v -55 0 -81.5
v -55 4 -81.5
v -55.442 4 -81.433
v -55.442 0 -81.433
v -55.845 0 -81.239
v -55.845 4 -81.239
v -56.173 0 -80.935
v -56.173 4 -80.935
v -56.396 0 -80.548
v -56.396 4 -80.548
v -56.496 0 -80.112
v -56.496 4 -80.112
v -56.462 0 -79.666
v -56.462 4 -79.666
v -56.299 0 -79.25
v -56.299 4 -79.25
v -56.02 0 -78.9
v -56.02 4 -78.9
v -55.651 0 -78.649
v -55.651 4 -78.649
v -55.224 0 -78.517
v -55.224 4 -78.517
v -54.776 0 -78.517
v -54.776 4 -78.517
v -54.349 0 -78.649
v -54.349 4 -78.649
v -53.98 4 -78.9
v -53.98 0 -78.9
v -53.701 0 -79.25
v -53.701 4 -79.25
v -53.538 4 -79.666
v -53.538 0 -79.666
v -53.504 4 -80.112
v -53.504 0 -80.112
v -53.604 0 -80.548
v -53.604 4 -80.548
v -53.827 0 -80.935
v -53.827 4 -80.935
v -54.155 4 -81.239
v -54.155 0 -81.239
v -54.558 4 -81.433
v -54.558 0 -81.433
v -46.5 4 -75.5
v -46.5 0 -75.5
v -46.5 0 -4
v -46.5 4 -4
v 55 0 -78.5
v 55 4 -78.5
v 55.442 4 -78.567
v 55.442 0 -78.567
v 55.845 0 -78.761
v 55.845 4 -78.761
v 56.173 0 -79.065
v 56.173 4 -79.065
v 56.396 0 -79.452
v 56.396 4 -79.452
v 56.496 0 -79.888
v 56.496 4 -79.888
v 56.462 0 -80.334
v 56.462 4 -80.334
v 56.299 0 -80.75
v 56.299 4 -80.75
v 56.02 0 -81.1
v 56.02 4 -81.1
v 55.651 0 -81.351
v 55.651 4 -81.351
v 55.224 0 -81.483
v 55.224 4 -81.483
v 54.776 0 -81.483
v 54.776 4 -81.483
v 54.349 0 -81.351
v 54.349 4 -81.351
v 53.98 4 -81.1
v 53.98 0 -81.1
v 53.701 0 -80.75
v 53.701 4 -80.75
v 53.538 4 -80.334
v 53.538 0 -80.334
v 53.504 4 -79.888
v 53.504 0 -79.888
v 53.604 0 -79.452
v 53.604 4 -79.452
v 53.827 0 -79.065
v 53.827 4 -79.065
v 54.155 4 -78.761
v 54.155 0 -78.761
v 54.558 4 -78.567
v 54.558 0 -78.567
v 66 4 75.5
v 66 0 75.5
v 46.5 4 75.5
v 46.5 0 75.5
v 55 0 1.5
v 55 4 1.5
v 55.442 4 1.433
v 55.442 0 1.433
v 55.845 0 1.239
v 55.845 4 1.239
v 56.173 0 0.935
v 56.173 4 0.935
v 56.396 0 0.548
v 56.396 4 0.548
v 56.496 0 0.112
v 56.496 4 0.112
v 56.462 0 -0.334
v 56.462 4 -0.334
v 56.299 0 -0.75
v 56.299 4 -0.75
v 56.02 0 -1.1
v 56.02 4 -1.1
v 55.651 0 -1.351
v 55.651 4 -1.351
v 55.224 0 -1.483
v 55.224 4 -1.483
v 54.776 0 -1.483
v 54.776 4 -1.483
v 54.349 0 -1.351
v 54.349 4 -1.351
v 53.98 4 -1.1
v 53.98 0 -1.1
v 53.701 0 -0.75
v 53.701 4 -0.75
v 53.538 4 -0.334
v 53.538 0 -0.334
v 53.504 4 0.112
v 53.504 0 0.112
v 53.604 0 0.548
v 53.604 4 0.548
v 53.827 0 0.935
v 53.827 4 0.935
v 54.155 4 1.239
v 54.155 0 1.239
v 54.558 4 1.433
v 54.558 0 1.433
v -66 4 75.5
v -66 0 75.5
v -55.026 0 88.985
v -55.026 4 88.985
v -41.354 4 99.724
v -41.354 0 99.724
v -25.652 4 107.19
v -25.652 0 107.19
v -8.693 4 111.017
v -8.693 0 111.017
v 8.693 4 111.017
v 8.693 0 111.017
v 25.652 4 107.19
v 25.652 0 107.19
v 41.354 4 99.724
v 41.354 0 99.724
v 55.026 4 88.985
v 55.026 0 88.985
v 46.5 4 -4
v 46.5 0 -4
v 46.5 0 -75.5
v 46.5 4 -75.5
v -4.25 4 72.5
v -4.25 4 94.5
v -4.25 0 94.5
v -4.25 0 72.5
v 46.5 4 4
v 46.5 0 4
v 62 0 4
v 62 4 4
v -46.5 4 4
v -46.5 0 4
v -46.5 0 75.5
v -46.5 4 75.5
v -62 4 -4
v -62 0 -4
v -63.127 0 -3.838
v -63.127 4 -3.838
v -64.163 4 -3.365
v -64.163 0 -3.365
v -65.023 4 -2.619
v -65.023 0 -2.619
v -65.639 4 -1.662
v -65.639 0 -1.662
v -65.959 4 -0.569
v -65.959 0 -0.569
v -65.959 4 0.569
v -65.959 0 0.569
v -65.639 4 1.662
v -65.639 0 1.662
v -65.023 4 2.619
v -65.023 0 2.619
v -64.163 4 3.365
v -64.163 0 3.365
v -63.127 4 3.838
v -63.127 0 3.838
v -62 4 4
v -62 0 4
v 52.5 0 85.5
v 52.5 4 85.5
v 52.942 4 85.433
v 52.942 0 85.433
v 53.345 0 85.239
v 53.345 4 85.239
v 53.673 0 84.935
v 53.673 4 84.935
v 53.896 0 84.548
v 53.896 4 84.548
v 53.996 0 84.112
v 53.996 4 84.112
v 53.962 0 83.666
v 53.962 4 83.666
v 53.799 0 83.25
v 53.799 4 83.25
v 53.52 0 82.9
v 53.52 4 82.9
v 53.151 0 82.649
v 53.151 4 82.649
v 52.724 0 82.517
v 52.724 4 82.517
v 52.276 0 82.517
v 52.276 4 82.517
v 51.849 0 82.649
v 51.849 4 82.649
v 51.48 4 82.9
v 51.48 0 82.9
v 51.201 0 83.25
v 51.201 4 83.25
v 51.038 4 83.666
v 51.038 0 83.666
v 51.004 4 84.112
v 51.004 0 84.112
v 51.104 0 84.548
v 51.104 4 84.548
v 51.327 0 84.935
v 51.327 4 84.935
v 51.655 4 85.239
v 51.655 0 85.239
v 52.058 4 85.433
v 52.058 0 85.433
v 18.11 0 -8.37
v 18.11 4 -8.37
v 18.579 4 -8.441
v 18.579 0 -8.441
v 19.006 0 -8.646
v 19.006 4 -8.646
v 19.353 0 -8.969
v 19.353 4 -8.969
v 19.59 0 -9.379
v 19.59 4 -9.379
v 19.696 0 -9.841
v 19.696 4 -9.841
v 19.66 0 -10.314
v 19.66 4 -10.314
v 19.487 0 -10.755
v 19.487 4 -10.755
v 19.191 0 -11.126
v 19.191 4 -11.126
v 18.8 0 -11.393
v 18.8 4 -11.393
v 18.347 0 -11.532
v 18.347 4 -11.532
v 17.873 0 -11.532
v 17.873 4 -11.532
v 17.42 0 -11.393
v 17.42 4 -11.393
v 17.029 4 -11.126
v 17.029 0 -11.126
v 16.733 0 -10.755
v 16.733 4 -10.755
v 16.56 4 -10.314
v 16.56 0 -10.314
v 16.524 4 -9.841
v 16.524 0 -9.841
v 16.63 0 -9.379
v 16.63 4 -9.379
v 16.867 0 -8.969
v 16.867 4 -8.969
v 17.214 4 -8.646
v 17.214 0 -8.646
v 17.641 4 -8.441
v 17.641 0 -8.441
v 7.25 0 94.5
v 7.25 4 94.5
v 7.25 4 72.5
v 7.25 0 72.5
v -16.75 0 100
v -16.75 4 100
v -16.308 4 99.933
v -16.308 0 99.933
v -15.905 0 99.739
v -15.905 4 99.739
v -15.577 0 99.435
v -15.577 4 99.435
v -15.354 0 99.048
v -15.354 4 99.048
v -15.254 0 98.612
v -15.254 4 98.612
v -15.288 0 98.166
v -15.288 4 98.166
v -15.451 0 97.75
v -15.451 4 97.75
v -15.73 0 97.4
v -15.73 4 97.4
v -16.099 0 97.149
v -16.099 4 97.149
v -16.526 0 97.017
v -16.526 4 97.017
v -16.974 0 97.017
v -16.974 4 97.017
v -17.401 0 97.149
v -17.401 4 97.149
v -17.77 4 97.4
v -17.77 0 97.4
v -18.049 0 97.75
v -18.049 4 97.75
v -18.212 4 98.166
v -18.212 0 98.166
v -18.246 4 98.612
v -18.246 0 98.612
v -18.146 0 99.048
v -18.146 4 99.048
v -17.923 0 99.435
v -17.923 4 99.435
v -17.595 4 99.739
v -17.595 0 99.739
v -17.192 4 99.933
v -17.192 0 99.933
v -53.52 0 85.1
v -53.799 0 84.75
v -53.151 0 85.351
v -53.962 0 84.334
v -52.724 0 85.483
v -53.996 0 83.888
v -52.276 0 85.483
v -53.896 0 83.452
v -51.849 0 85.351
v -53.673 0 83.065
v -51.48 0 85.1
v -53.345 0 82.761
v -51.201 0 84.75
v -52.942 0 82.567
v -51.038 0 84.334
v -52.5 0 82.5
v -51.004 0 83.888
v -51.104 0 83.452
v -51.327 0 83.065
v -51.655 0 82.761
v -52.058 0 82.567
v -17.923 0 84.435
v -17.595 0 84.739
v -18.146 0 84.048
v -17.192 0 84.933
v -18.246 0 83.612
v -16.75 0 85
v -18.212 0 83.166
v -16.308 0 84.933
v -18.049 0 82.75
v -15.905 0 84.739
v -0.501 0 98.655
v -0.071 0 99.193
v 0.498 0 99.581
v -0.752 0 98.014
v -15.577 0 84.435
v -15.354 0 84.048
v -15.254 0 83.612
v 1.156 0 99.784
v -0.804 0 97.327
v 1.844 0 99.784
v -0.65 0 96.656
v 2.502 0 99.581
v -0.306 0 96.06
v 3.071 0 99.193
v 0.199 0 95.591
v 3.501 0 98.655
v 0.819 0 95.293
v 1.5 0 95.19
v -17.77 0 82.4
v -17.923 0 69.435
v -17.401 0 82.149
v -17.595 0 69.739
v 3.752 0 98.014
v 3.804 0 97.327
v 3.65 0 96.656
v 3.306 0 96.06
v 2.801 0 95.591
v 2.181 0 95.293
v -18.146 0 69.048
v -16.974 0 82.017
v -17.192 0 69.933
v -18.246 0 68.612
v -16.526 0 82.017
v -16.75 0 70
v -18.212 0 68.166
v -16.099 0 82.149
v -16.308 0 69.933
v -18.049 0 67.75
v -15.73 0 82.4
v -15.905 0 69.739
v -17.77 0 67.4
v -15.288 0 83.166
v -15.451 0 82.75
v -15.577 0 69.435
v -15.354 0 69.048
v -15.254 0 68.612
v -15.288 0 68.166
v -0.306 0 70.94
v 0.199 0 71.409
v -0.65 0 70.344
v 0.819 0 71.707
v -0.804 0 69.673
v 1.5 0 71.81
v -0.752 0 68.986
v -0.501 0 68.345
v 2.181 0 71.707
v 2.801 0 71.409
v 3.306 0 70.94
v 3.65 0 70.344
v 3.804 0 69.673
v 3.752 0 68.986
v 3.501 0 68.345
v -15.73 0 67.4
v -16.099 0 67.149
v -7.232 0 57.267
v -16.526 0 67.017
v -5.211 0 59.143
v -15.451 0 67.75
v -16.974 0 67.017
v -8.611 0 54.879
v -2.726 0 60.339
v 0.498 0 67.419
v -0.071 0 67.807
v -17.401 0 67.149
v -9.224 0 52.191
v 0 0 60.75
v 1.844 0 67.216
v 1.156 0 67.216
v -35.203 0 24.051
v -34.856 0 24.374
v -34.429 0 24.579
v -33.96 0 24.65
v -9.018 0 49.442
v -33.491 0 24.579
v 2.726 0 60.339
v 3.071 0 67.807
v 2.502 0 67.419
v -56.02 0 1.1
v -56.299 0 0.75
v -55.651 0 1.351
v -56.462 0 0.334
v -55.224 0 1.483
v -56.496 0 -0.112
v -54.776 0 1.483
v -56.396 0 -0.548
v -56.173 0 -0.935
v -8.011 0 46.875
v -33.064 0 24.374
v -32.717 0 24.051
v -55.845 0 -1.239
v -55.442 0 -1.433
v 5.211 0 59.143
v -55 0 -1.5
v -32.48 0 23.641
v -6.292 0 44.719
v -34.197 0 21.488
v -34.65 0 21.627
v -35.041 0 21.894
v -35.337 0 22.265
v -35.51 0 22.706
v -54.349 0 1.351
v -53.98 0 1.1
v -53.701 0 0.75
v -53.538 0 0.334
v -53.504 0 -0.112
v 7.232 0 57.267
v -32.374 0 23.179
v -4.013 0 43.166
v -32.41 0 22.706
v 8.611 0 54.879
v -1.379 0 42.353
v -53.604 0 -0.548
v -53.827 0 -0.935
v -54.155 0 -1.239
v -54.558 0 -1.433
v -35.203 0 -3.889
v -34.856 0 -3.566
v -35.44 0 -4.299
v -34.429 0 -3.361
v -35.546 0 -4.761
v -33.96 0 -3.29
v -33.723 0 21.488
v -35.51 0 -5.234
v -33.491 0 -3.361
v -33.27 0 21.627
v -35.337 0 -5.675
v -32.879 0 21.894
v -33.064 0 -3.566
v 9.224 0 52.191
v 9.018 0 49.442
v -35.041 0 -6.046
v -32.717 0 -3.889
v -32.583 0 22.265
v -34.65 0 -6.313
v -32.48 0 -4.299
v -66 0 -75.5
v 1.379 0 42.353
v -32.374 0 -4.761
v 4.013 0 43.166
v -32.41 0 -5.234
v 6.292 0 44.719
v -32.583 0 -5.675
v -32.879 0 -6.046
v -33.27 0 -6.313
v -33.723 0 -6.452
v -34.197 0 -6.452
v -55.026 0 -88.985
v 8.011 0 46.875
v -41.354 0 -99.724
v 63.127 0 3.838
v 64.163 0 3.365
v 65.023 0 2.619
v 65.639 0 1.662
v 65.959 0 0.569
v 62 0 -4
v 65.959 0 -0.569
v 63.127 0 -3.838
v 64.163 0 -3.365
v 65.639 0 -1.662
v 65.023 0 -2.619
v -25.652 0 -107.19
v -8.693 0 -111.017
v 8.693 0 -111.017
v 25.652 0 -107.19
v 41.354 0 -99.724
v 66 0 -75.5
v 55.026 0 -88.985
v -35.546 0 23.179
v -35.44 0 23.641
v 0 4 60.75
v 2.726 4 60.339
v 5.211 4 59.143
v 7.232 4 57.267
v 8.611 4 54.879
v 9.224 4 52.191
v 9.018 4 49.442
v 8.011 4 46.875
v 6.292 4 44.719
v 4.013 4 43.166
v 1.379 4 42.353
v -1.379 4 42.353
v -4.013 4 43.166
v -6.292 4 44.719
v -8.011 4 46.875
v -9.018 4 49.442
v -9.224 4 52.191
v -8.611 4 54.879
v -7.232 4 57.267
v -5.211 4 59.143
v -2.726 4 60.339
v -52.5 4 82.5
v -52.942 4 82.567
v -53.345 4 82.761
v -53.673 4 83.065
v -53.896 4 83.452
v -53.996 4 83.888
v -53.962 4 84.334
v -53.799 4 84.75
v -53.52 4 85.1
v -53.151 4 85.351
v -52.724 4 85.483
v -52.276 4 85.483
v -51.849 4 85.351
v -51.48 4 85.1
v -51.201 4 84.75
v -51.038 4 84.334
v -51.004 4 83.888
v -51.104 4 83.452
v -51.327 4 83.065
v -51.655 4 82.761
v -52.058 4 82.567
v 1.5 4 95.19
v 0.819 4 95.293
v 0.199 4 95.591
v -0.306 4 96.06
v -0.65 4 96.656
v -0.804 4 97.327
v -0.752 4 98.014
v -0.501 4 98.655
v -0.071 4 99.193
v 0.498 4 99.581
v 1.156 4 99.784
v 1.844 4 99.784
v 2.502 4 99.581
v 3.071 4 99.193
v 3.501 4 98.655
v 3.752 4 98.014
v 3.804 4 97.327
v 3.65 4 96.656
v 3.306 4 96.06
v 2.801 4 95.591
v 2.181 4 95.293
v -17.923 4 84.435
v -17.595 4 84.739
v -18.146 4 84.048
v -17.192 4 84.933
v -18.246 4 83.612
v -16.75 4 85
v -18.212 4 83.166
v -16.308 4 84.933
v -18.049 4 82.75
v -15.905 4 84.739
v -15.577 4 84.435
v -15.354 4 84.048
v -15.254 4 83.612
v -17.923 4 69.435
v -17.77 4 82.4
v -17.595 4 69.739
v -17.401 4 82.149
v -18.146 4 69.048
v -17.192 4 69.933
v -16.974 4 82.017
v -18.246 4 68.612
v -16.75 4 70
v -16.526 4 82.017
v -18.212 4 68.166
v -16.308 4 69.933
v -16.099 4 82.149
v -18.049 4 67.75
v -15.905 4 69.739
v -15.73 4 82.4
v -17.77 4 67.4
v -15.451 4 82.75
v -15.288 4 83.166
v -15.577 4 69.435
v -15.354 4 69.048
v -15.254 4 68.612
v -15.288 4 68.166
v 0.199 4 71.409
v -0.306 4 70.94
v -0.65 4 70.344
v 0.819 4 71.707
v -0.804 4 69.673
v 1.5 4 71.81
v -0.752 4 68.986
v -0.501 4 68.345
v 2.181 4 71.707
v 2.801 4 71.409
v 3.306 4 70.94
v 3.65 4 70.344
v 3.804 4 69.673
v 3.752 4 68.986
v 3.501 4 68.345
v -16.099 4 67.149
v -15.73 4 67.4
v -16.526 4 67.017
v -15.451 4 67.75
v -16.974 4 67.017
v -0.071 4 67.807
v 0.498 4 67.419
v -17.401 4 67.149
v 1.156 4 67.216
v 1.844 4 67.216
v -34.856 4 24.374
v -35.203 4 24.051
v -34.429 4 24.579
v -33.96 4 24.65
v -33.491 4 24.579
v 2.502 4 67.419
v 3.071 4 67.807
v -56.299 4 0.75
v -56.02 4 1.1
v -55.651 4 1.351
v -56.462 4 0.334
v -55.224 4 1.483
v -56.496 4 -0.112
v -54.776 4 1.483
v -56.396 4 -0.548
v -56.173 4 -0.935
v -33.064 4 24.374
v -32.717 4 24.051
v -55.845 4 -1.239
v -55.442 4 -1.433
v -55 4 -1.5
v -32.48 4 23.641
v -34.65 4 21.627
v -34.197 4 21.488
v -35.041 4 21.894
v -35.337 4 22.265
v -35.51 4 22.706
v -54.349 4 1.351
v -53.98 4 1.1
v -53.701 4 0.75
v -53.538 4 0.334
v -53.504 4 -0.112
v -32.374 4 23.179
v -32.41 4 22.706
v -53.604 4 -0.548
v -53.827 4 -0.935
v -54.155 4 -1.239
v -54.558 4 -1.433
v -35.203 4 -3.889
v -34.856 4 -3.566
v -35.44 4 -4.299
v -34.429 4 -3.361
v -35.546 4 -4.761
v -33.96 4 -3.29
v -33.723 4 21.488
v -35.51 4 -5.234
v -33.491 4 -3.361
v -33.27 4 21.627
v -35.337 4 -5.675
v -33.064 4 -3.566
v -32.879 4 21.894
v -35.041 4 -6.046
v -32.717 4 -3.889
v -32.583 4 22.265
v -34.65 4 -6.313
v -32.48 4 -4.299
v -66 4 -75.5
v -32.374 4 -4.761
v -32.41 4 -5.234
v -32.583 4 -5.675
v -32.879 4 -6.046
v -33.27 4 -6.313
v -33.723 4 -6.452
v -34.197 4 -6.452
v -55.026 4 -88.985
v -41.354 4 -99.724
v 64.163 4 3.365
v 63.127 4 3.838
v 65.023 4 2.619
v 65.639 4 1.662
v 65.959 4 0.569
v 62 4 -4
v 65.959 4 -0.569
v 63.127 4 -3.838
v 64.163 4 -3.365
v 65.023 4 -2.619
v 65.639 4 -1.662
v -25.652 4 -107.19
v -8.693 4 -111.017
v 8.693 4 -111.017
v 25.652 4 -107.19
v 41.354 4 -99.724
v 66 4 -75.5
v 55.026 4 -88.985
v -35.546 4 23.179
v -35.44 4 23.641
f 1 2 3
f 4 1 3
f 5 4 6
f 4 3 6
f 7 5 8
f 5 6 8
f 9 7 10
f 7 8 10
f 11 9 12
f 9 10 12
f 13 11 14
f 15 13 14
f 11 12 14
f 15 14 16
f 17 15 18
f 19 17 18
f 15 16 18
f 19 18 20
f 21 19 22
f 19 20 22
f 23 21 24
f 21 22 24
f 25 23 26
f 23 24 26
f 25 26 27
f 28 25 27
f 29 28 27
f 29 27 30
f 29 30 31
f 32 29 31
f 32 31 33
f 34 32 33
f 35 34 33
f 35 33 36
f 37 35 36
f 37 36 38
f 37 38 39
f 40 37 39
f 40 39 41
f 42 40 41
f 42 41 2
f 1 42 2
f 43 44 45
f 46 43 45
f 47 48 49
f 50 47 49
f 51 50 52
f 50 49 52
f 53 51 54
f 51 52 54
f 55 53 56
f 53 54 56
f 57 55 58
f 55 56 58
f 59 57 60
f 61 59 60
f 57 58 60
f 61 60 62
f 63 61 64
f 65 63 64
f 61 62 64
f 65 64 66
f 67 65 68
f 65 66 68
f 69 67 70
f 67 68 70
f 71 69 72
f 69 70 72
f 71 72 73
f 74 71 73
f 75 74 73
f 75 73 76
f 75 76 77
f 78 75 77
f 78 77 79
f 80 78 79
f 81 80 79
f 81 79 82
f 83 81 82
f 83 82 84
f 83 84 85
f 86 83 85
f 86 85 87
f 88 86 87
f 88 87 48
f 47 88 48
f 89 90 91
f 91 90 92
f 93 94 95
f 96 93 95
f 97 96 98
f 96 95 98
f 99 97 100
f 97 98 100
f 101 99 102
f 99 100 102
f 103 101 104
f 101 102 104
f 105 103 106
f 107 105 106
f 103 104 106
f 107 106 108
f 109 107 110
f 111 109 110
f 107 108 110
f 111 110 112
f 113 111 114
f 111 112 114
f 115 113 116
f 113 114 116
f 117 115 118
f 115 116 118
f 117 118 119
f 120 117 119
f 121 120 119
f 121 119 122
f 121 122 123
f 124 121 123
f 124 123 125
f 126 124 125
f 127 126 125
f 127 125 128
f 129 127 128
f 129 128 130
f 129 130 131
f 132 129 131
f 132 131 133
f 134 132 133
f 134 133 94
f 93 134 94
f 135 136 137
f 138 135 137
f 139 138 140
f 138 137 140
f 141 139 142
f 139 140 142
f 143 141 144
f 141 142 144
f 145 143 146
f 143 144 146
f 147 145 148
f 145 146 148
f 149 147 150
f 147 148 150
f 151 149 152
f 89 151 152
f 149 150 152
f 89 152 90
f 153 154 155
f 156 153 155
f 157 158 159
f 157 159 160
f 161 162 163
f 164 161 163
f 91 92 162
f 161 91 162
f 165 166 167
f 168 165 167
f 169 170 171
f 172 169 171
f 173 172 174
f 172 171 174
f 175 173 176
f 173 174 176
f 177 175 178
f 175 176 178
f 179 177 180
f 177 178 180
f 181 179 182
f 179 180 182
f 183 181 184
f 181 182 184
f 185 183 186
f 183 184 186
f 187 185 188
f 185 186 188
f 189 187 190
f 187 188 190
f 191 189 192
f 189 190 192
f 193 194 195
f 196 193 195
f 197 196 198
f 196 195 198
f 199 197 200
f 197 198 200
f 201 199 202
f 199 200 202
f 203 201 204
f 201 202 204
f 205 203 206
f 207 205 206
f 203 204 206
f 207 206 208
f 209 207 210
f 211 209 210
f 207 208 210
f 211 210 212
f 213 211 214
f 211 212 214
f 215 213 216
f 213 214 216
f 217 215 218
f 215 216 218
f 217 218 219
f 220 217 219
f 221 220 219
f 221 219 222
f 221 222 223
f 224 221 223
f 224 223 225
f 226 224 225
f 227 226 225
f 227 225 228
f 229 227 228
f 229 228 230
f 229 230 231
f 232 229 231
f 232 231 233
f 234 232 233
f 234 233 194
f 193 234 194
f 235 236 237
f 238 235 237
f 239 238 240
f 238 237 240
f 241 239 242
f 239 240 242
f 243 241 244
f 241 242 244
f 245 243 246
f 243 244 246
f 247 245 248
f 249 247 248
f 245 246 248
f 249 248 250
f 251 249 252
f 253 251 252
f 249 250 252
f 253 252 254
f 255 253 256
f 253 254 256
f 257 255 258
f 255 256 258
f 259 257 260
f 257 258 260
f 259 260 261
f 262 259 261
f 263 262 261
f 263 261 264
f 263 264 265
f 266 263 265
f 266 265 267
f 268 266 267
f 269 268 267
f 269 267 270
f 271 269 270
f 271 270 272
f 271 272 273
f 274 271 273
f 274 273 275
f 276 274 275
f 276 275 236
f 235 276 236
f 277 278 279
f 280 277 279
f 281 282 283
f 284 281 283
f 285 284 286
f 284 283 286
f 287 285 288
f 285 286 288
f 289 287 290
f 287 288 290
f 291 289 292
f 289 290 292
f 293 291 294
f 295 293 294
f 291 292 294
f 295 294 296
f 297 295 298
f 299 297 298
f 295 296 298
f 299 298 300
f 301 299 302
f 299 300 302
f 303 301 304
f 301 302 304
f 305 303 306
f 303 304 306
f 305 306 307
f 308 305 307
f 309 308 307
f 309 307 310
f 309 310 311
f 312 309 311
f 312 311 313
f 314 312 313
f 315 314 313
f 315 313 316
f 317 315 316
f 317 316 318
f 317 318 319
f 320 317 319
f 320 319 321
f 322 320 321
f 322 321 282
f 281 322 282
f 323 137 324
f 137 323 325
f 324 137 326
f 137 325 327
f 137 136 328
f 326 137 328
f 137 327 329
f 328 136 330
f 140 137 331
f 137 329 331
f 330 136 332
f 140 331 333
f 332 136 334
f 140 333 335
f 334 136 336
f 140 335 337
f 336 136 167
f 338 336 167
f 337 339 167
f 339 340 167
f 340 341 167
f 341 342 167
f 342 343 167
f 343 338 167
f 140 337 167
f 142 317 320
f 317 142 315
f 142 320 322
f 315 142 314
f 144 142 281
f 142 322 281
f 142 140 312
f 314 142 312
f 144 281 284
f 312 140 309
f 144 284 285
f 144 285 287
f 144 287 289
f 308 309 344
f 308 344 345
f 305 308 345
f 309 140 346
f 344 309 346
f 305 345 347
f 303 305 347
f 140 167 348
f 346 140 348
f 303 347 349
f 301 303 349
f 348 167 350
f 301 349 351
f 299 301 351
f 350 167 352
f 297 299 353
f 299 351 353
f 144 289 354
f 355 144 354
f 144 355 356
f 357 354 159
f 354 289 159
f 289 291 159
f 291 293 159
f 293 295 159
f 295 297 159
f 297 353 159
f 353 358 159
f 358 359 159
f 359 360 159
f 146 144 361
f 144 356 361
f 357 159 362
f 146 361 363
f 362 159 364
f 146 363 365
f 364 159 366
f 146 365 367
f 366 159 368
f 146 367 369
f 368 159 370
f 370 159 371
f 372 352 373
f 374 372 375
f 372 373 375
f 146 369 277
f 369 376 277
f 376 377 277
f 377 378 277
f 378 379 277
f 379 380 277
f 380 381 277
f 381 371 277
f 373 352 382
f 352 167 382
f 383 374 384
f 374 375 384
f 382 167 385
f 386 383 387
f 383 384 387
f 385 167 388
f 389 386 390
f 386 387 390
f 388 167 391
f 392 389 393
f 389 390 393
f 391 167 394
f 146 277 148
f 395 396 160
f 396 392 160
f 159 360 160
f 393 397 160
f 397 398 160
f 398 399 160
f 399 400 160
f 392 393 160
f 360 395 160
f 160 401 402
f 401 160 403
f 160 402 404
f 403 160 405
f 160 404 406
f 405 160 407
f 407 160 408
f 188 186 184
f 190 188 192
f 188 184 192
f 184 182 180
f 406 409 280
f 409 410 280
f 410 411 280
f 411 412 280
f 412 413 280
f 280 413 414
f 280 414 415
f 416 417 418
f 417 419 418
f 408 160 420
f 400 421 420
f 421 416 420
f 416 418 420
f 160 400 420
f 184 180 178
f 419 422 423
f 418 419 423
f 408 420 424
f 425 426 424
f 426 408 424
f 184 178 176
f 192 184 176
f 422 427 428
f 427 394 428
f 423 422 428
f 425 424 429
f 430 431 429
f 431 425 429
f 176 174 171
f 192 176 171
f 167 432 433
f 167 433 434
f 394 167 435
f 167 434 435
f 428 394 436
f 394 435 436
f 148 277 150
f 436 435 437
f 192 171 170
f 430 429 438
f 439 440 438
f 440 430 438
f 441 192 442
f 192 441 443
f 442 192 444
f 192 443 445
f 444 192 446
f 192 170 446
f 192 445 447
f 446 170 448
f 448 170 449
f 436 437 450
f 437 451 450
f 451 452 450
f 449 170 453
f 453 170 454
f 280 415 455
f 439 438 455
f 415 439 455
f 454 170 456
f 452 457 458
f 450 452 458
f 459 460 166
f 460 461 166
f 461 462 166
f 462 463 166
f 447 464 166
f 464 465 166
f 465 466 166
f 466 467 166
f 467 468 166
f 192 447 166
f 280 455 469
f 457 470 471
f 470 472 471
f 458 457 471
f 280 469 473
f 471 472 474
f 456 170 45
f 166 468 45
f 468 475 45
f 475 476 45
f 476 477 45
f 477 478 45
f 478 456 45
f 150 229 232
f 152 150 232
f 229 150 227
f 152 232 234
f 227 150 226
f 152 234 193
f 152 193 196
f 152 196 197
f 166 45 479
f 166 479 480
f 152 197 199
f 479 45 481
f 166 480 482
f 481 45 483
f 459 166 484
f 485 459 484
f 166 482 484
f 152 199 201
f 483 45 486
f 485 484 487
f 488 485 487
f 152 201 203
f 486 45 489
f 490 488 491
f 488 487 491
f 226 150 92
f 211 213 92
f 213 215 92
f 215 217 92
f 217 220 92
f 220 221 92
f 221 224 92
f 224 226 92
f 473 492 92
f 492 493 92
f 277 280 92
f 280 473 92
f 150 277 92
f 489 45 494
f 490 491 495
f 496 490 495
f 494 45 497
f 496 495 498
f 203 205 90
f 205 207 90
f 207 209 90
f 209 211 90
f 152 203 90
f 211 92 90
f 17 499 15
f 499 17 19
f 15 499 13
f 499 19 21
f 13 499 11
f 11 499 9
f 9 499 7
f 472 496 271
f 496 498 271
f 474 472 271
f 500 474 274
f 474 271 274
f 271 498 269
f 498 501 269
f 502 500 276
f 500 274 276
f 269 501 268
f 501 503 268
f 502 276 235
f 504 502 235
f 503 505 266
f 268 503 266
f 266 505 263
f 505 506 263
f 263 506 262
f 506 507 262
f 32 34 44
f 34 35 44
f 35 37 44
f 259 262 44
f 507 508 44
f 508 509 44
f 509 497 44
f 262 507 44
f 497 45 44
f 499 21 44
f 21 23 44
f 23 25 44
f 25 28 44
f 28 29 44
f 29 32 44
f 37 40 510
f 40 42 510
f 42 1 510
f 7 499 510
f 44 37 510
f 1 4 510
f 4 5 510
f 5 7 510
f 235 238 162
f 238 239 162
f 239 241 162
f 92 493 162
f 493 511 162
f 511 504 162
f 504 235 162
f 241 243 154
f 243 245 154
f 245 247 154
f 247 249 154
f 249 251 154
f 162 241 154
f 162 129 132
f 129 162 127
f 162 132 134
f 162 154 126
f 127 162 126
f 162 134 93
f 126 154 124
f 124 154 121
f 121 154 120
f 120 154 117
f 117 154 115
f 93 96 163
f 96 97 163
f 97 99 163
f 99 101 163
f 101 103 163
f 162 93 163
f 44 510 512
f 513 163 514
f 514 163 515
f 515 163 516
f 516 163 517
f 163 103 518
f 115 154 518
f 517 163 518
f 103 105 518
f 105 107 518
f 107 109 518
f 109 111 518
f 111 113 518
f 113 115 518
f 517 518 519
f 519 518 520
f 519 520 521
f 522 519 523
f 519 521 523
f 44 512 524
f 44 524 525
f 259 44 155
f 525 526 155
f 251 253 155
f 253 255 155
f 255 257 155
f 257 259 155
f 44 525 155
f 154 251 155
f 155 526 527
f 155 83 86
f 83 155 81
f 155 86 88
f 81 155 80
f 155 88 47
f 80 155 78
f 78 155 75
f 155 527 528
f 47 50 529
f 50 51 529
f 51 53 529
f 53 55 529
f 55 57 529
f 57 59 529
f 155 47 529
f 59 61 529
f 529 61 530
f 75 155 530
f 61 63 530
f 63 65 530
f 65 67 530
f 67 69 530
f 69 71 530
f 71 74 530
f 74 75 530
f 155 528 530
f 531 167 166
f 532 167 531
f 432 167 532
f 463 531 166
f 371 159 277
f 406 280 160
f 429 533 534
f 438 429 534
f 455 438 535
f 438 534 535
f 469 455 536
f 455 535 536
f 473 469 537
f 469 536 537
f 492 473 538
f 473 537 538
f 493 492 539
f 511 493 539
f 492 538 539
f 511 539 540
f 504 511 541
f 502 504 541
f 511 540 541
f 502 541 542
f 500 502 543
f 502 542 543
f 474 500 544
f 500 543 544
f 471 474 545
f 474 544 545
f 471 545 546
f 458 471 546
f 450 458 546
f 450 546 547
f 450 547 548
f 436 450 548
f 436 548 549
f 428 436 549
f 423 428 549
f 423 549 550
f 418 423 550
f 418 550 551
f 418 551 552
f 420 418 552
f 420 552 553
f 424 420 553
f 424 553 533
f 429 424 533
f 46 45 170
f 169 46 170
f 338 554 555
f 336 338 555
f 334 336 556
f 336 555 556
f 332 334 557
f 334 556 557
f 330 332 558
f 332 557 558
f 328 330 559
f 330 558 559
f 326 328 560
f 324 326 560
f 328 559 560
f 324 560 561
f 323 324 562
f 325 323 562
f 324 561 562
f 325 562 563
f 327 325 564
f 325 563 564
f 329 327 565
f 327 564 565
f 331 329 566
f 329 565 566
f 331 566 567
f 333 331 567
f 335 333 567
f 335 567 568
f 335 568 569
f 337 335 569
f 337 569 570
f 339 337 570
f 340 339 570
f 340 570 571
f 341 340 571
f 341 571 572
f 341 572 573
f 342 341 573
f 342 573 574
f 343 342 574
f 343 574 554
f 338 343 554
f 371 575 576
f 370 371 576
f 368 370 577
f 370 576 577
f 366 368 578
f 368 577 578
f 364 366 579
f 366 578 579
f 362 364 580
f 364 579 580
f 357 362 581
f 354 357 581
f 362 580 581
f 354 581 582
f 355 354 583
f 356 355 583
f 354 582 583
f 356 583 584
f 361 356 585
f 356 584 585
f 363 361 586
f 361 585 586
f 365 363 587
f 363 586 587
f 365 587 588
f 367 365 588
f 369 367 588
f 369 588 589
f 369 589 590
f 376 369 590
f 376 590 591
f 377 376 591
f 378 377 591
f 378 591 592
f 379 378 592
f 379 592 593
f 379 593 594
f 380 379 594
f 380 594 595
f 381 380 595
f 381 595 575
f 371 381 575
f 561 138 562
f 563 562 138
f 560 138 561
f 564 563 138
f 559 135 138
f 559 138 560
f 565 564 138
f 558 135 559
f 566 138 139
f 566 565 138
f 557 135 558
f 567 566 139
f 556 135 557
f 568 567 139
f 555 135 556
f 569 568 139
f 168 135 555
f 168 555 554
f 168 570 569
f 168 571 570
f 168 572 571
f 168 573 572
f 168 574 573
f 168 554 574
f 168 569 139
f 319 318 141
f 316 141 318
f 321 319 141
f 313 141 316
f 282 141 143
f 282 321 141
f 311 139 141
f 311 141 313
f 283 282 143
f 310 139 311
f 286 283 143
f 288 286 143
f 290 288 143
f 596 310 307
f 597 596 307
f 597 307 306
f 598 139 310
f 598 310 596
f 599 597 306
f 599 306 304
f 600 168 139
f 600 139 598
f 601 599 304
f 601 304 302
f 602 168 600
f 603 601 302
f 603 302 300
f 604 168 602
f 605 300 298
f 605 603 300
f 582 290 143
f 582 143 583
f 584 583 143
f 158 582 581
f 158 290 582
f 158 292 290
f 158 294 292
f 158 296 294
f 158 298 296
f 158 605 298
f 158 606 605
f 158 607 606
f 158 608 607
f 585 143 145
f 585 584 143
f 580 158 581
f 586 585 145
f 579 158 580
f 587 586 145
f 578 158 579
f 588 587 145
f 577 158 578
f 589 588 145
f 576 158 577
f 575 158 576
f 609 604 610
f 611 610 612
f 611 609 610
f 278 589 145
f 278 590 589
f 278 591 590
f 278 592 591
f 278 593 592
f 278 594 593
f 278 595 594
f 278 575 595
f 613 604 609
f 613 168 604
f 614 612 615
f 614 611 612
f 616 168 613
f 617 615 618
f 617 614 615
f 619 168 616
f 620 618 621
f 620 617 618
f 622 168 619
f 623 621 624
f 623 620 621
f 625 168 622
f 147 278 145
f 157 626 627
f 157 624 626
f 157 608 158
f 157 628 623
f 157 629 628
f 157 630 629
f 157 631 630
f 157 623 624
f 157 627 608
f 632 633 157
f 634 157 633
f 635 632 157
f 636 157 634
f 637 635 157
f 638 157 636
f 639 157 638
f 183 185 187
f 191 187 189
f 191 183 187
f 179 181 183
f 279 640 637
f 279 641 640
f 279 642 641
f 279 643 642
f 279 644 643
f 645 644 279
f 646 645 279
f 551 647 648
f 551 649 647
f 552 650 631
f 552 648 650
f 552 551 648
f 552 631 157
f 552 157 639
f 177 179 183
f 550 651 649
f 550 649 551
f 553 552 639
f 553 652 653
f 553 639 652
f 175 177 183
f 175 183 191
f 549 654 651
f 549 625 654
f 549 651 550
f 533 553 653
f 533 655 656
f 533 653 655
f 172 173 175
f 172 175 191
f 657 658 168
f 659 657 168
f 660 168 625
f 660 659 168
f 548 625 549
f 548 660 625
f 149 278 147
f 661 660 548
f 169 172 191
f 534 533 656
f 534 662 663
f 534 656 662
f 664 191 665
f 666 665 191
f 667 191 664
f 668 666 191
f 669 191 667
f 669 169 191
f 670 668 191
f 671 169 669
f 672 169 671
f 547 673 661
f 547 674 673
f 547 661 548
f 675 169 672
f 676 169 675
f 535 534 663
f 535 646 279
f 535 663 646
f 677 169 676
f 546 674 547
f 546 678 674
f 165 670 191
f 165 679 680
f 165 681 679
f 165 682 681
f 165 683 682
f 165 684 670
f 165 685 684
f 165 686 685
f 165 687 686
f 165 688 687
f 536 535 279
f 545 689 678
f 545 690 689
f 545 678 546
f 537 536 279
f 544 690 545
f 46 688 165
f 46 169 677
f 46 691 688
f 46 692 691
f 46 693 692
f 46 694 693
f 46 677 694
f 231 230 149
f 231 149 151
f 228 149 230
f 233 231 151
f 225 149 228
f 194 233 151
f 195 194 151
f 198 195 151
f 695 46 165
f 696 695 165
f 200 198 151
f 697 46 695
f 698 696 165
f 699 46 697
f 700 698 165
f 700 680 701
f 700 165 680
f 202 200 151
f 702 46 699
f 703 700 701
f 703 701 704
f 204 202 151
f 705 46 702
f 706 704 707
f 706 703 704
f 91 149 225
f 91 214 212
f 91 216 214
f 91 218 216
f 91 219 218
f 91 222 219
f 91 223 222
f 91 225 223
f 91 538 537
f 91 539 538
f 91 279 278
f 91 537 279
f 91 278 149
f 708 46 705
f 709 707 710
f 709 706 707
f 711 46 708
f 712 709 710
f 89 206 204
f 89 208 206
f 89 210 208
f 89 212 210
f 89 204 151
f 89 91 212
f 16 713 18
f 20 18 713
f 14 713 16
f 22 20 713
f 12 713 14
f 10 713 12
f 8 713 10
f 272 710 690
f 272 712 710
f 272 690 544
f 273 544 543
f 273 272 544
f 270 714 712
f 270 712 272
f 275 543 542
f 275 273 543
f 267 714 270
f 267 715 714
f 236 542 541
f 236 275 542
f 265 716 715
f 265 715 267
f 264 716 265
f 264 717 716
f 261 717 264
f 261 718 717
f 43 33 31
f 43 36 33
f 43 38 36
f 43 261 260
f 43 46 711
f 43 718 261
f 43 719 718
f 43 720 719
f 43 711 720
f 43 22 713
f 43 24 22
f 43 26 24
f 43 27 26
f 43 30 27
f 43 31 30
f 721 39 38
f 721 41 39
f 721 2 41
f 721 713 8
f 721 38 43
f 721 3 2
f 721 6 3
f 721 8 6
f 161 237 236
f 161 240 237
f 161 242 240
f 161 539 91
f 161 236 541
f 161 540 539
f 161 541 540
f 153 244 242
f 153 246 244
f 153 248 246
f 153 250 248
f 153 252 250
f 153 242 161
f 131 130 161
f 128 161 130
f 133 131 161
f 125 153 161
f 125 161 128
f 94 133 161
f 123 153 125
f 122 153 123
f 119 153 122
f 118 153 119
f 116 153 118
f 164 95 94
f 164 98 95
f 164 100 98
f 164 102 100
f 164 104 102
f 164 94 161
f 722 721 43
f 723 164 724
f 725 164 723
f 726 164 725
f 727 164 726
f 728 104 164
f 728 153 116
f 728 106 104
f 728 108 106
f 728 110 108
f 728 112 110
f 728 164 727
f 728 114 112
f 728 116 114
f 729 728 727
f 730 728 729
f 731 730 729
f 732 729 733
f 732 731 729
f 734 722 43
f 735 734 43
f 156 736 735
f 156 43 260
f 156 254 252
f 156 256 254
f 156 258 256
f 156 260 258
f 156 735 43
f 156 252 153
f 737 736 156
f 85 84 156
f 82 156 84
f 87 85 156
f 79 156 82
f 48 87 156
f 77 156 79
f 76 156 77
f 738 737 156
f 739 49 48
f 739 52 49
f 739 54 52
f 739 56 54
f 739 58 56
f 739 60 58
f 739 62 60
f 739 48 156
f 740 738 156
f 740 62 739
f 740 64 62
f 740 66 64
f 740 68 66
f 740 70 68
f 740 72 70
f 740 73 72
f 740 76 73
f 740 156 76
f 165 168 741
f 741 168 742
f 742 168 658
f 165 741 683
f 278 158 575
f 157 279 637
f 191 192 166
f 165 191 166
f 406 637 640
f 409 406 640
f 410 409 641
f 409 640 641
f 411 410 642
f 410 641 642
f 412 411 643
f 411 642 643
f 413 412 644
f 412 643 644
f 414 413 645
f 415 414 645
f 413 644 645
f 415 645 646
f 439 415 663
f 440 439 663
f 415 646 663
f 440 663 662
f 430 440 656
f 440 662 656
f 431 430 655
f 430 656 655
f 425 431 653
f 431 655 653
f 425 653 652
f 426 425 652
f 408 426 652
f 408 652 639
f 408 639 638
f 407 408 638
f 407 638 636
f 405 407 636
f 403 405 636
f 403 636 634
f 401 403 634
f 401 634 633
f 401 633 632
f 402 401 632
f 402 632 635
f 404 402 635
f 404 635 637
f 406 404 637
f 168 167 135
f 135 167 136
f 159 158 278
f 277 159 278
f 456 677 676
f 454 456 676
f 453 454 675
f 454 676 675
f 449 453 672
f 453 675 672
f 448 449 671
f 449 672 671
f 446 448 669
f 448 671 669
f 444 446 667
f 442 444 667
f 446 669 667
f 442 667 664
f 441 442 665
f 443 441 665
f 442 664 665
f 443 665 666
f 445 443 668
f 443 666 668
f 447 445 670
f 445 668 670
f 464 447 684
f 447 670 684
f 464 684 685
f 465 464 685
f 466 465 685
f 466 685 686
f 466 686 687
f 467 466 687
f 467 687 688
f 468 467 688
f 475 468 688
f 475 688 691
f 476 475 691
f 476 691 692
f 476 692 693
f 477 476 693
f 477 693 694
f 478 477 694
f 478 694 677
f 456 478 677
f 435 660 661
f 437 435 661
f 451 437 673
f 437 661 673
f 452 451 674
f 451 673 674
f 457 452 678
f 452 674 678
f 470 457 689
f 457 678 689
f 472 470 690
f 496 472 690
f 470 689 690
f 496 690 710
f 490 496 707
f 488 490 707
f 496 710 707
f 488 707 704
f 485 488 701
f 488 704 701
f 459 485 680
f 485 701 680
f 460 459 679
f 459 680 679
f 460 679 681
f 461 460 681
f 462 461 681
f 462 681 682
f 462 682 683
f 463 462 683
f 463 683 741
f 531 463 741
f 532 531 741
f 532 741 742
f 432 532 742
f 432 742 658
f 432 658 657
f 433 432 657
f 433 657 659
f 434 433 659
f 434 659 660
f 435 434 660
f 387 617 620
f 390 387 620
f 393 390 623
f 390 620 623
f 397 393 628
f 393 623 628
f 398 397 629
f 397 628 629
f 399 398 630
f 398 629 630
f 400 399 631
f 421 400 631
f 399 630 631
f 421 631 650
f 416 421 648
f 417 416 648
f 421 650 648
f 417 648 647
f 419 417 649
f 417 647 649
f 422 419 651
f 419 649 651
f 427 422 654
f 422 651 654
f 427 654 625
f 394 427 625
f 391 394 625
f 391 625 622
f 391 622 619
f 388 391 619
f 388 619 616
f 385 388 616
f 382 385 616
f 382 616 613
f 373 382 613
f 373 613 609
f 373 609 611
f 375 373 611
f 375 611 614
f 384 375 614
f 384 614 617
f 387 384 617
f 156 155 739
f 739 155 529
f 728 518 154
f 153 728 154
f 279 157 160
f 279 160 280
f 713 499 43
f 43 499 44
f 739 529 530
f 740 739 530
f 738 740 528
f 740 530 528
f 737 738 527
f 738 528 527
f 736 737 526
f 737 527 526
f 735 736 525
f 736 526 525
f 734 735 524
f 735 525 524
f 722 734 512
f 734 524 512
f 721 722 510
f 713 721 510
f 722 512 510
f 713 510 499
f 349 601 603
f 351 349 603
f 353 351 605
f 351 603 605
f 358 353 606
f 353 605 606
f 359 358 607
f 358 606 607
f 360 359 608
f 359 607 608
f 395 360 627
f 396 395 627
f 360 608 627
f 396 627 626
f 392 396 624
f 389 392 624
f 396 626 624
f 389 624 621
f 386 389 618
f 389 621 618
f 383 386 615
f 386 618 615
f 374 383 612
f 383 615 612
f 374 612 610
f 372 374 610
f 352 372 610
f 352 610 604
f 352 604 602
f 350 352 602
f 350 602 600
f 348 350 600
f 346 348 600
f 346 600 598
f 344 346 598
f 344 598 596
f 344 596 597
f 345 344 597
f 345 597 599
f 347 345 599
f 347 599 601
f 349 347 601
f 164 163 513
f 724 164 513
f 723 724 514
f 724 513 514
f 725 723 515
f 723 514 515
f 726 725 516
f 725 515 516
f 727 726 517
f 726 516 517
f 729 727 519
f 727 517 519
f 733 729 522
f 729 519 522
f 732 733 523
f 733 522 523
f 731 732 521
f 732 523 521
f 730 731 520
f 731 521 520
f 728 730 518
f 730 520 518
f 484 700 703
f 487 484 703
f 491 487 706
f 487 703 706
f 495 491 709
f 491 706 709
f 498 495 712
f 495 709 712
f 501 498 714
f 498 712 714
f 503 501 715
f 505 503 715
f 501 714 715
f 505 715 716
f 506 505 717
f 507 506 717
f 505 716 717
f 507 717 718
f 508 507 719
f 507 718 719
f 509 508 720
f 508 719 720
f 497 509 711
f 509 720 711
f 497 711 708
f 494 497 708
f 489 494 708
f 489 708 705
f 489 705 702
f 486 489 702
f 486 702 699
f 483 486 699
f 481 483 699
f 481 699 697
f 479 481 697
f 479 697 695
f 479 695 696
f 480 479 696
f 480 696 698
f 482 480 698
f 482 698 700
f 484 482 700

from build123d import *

# Parameters (mm, degrees)
PLATE_DEPTH           = 4
SKETCH2_R             = 1.5
PLATE_MOUNTINGS_DEPTH = 130.631207662
SKETCH3_R             = 1.5
SKETCH3_R_2           = 2.31
SKETCH3_R_3           = 9.25
SKETCH3_W             = 11.5
SKETCH3_H             = 22
CUT_EXTRUDE1_DEPTH    = 130.631207662
SKETCH4_R             = 1.59
CUT_EXTRUDE2_DEPTH    = 130.631207662


with BuildPart() as part:
    # Sketch1 → Plate (new body)
    with BuildSketch(Plane(origin=(0, 0, 0), x_dir=(1, 0, 0), z_dir=(0, 1, 0))):
        with BuildLine():
            Line((62, 4), (46.5, 4))
            Line((46.5, 4), (46.5, 75.5))
            Line((46.5, 75.5), (66, 75.5))
            ThreePointArc((66, 75.5), (0, 111.5), (-66, 75.5))
            Line((-66, 75.5), (-46.5, 75.5))
            Line((-46.5, 75.5), (-46.5, 4))
            Line((-46.5, 4), (-62, 4))
            ThreePointArc((-62, 4), (-66, 0), (-62, -4))
            Line((-62, -4), (-46.5, -4))
            Line((-46.5, -4), (-46.5, -75.5))
            Line((-46.5, -75.5), (-66, -75.5))
            ThreePointArc((-66, -75.5), (0, -111.5), (66, -75.5))
            Line((66, -75.5), (46.5, -75.5))
            Line((46.5, -75.5), (46.5, -4))
            Line((46.5, -4), (62, -4))
            ThreePointArc((62, -4), (66, 0), (62, 4))
        make_face()
    extrude(amount=PLATE_DEPTH)

    # Sketch2 → Plate mountings (cut, through all)
    with BuildSketch(Plane(origin=(0, 4, 0), x_dir=(1, 0, 0), z_dir=(0, 1, 0))):
        with Locations(Location((55, 0, 0), (0, 0, 270))):
            Circle(SKETCH2_R)
        with Locations(Location((55, 80, 0), (0, 0, 270))):
            Circle(SKETCH2_R)
        with Locations(Location((-55, 0, 0), (0, 0, 90))):
            Circle(SKETCH2_R)
        with Locations(Location((-55, 80, 0), (0, 0, 90))):
            Circle(SKETCH2_R)
        with Locations(Location((52.5, -84, 0), (0, 0, 270))):
            Circle(SKETCH2_R)
        with Locations(Location((-52.5, -84, 0), (0, 0, 90))):
            Circle(SKETCH2_R)
    extrude(amount=-PLATE_MOUNTINGS_DEPTH, mode=Mode.SUBTRACT)

    # Sketch3 → Cut-Extrude1 (cut, through all)
    with BuildSketch(Plane(origin=(0, 4, 0), x_dir=(1, 0, 0), z_dir=(0, 1, 0))):
        with Locations(Location((-16.75, -98.5, 0), (0, 0, 270))):
            Circle(SKETCH3_R)
        with Locations(Location((1.5, -69.5, 0), (0, 0, 270))):
            Circle(SKETCH3_R_2)
        with Locations(Location((1.5, -97.5, 0), (0, 0, 90))):
            Circle(SKETCH3_R_2)
        with Locations(Location((-16.75, -83.5, 0), (0, 0, 270))):
            Circle(SKETCH3_R)
        with Locations(Location((-16.75, -68.5, 0), (0, 0, 270))):
            Circle(SKETCH3_R)
        with Locations(Location((0, -51.5, 0), (0, 0, 270))):
            Circle(SKETCH3_R_3)
        with Locations((1.5, -83.5)):
            Rectangle(SKETCH3_W, SKETCH3_H)
    extrude(amount=-CUT_EXTRUDE1_DEPTH, mode=Mode.SUBTRACT)

    # Sketch4 → Cut-Extrude2 (cut, through all)
    with BuildSketch(Plane(origin=(0, 4, 0), x_dir=(1, 0, 0), z_dir=(0, 1, 0))):
        with Locations(Location((18.11, 9.96, 0), (0, 0, 270))):
            Circle(SKETCH4_R)
        with Locations(Location((-33.96, 4.88, 0), (0, 0, 270))):
            Circle(SKETCH4_R)
        with Locations(Location((-33.96, -23.06, 0), (0, 0, 270))):
            Circle(SKETCH4_R)
    extrude(amount=-CUT_EXTRUDE2_DEPTH, mode=Mode.SUBTRACT)


solid = part.part
